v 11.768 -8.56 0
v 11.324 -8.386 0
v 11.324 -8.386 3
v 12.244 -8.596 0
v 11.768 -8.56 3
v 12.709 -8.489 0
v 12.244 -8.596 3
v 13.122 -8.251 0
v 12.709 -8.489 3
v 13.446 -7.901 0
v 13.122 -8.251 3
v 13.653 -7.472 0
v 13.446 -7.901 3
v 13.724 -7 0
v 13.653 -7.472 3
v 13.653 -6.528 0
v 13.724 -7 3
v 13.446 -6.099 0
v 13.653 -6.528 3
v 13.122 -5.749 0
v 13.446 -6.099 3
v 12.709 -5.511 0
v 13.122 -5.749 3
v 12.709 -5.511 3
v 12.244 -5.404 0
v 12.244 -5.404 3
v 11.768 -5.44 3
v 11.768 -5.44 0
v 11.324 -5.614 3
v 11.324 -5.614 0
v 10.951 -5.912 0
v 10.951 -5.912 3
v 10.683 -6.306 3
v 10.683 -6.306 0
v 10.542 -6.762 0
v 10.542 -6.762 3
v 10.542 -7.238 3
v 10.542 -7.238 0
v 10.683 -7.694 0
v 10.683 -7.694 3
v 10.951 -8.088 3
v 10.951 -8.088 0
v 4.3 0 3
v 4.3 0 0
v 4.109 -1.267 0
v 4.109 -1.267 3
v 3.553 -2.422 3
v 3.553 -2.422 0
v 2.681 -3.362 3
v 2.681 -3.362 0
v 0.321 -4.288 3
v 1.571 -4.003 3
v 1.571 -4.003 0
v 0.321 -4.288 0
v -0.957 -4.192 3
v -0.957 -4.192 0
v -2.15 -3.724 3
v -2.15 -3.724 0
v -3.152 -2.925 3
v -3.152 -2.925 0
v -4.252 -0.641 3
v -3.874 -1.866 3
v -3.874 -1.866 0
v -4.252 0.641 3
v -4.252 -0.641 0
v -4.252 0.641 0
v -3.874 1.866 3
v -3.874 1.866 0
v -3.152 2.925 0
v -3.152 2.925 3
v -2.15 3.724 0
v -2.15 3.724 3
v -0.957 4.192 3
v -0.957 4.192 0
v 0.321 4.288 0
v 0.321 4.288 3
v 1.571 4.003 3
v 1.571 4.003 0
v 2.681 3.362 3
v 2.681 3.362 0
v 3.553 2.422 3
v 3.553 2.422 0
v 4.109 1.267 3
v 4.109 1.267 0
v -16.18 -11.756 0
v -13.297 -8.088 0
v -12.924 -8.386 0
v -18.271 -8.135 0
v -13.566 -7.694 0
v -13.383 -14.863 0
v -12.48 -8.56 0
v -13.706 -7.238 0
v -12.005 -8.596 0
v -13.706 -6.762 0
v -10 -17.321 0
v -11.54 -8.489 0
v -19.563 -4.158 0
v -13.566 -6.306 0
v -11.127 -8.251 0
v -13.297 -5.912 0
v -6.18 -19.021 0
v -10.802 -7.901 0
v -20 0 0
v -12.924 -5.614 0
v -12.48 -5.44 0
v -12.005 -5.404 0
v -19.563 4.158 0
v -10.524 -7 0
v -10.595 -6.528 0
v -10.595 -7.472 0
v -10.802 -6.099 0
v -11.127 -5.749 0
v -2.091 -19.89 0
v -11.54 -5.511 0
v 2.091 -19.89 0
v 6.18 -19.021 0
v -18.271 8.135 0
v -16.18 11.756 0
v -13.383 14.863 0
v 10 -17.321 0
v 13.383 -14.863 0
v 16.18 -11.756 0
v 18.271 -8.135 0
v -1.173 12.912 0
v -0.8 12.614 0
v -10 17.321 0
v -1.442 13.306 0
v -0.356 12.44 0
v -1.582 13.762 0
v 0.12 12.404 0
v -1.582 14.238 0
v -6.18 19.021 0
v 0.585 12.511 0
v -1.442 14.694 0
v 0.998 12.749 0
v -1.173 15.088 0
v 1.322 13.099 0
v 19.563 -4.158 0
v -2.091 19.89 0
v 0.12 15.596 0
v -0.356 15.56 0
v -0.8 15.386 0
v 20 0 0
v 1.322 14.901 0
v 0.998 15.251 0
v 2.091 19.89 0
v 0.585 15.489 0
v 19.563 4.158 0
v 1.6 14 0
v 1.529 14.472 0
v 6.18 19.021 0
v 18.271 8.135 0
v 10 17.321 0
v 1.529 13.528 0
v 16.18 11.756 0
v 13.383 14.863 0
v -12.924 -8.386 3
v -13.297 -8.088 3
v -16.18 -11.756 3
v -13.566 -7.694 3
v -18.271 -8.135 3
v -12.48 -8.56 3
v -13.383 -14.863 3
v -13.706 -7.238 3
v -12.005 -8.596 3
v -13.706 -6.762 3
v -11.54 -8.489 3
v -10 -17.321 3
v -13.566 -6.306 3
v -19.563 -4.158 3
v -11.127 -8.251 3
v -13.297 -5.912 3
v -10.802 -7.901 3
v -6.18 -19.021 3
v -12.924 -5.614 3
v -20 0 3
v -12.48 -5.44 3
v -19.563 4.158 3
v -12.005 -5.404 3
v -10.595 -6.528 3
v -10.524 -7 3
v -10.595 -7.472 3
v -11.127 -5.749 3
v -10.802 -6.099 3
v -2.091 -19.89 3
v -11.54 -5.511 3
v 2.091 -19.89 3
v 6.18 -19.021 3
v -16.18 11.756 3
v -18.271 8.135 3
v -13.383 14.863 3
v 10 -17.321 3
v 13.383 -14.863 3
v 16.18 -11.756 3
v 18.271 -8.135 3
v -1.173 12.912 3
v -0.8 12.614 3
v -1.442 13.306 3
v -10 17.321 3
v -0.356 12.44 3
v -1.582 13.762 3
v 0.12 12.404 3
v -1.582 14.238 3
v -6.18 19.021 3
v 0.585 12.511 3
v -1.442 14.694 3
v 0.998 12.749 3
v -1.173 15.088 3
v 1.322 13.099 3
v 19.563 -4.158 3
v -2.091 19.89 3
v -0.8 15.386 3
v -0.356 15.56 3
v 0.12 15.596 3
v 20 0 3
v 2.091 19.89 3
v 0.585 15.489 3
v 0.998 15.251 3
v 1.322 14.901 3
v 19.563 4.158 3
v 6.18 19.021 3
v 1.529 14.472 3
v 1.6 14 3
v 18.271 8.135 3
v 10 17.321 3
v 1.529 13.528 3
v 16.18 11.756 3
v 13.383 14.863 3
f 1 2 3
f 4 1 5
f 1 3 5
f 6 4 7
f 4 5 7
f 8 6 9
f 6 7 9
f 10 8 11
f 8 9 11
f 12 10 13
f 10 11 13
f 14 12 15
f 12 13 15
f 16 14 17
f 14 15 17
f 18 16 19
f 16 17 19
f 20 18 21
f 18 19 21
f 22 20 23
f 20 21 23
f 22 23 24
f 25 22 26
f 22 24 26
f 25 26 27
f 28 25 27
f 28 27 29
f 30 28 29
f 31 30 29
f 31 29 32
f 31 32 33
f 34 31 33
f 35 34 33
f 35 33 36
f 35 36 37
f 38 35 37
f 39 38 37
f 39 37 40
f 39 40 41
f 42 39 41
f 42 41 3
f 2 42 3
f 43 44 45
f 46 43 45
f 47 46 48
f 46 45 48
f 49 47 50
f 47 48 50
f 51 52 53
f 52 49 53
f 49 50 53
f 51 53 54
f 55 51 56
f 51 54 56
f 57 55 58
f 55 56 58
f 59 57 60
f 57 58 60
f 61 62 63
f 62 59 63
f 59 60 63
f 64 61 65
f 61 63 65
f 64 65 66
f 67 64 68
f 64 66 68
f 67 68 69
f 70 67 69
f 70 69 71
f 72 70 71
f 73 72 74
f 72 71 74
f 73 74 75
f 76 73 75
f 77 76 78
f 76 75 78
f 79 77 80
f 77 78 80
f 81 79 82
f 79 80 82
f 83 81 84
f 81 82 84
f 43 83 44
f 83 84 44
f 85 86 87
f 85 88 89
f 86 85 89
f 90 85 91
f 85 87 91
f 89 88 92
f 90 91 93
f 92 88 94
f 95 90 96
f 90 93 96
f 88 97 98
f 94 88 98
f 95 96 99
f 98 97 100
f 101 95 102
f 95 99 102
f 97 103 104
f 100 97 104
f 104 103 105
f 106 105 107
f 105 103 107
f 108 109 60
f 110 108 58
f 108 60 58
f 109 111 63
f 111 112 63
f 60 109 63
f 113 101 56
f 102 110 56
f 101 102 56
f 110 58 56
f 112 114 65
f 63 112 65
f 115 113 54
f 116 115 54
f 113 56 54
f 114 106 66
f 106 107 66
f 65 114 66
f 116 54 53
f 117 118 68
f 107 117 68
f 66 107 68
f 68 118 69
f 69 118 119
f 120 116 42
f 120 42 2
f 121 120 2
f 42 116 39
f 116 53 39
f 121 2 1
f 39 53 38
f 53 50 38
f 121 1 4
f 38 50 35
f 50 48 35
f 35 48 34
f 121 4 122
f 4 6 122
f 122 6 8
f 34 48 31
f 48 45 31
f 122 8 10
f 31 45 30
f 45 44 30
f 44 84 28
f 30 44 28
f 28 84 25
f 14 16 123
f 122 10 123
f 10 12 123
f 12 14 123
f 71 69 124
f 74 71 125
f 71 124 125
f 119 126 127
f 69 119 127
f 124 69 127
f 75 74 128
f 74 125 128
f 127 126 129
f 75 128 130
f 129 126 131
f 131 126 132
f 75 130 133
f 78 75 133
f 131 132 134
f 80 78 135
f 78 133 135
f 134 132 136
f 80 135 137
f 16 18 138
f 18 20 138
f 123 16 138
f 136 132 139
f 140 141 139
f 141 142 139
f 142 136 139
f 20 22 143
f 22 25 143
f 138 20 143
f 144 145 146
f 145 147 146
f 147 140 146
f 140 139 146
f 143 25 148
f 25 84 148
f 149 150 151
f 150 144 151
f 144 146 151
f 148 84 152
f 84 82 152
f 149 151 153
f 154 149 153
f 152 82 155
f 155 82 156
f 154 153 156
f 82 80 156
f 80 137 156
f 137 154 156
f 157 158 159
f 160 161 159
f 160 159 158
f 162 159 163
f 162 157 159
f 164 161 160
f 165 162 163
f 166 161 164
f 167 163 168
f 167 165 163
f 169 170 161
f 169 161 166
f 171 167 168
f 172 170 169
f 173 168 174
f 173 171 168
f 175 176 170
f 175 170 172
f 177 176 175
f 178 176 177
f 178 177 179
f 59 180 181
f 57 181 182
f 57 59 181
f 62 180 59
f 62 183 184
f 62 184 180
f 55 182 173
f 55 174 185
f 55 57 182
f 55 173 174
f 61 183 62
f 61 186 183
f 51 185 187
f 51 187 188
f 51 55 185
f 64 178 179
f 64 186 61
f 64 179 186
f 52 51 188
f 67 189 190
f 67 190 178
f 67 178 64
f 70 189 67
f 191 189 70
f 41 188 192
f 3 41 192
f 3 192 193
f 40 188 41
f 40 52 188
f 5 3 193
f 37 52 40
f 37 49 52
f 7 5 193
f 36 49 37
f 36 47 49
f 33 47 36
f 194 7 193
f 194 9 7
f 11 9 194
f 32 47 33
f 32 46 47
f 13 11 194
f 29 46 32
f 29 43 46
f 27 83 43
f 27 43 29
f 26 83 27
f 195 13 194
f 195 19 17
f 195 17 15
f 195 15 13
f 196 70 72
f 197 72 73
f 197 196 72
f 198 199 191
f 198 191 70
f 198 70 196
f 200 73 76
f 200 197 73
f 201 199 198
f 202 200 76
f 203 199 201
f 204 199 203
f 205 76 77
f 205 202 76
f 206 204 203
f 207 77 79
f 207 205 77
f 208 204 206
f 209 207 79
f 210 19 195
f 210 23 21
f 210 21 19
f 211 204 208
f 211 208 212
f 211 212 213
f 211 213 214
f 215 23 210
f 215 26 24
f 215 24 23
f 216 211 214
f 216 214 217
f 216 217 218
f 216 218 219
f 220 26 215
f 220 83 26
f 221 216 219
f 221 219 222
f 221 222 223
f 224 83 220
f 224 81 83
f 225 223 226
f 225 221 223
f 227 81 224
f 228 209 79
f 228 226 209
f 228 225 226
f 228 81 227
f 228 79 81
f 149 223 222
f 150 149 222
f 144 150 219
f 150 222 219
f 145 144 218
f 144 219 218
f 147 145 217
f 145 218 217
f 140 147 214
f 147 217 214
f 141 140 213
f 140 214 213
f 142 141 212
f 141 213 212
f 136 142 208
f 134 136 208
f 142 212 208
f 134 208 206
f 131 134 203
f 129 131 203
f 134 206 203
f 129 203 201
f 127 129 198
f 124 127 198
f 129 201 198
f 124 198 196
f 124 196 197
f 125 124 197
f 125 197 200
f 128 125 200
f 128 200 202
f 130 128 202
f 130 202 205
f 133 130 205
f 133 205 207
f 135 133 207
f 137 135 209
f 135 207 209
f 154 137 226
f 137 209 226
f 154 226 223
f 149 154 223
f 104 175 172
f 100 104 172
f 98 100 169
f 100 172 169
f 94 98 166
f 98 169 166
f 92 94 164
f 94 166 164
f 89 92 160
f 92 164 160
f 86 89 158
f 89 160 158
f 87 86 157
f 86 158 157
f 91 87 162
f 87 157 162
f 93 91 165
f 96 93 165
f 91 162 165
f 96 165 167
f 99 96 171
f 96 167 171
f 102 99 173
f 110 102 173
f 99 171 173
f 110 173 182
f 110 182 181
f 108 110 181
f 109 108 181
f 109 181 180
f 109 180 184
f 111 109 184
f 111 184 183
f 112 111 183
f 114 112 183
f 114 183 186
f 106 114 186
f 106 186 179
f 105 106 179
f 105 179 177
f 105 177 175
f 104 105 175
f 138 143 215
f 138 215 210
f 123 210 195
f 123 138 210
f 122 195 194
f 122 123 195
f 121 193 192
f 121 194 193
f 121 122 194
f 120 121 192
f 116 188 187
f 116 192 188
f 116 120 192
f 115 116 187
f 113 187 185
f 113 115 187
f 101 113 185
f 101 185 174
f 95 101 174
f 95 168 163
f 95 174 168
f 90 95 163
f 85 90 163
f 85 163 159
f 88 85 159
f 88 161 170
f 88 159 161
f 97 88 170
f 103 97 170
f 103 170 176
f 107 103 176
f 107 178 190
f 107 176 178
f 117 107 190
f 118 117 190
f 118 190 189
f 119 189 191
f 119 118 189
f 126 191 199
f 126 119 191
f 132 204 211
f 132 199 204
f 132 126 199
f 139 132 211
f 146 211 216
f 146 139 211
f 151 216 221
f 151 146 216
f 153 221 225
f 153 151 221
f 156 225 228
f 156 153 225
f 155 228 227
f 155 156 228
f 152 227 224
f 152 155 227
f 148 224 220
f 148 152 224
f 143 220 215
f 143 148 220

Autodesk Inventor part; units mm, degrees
ref_plane "YZ Plane" through (0, 0, 0) normal (1, 0, 0) x (0, 1, 0)
ref_plane "XZ Plane" through (0, 0, 0) normal (0, 1, 0) x (-1, 0, 0)
ref_plane "XY Plane" through (0, 0, 0) normal (0, 0, 1) x (1, 0, 0)
sketch "Sketch1" plane through (0, 0, 0) normal (0, 0, 1) x (1, 0, 0)
  circle A0 centre (0, 0) radius 20
  circle A1 centre (0, 0) radius 4.3
  dimension "d0" = 40
  dimension "d2" = 8.6
extrude "Extrusion1" add sketch "Sketch1" along normal blind 3
sketch "Sketch2" plane through (0, 0, 3) normal (0, 0, 1) x (1, 0, 0)
  circle A0 centre (0, 14) radius 1.6
  line L0 (0, -28) -> (0, 28) projected
  point P0 (0, 0)
  dimension "d5" = 14
  dimension "d6" = 3.2
extrude "Extrusion2" cut sketch "Sketch2" against normal blind 10
pattern_circular "Circular Pattern1" count 3 over 360 about axis through (0, 0, 0) along (0, 0, 1) of "Extrusion2"
properties part number "bearing_holder"
